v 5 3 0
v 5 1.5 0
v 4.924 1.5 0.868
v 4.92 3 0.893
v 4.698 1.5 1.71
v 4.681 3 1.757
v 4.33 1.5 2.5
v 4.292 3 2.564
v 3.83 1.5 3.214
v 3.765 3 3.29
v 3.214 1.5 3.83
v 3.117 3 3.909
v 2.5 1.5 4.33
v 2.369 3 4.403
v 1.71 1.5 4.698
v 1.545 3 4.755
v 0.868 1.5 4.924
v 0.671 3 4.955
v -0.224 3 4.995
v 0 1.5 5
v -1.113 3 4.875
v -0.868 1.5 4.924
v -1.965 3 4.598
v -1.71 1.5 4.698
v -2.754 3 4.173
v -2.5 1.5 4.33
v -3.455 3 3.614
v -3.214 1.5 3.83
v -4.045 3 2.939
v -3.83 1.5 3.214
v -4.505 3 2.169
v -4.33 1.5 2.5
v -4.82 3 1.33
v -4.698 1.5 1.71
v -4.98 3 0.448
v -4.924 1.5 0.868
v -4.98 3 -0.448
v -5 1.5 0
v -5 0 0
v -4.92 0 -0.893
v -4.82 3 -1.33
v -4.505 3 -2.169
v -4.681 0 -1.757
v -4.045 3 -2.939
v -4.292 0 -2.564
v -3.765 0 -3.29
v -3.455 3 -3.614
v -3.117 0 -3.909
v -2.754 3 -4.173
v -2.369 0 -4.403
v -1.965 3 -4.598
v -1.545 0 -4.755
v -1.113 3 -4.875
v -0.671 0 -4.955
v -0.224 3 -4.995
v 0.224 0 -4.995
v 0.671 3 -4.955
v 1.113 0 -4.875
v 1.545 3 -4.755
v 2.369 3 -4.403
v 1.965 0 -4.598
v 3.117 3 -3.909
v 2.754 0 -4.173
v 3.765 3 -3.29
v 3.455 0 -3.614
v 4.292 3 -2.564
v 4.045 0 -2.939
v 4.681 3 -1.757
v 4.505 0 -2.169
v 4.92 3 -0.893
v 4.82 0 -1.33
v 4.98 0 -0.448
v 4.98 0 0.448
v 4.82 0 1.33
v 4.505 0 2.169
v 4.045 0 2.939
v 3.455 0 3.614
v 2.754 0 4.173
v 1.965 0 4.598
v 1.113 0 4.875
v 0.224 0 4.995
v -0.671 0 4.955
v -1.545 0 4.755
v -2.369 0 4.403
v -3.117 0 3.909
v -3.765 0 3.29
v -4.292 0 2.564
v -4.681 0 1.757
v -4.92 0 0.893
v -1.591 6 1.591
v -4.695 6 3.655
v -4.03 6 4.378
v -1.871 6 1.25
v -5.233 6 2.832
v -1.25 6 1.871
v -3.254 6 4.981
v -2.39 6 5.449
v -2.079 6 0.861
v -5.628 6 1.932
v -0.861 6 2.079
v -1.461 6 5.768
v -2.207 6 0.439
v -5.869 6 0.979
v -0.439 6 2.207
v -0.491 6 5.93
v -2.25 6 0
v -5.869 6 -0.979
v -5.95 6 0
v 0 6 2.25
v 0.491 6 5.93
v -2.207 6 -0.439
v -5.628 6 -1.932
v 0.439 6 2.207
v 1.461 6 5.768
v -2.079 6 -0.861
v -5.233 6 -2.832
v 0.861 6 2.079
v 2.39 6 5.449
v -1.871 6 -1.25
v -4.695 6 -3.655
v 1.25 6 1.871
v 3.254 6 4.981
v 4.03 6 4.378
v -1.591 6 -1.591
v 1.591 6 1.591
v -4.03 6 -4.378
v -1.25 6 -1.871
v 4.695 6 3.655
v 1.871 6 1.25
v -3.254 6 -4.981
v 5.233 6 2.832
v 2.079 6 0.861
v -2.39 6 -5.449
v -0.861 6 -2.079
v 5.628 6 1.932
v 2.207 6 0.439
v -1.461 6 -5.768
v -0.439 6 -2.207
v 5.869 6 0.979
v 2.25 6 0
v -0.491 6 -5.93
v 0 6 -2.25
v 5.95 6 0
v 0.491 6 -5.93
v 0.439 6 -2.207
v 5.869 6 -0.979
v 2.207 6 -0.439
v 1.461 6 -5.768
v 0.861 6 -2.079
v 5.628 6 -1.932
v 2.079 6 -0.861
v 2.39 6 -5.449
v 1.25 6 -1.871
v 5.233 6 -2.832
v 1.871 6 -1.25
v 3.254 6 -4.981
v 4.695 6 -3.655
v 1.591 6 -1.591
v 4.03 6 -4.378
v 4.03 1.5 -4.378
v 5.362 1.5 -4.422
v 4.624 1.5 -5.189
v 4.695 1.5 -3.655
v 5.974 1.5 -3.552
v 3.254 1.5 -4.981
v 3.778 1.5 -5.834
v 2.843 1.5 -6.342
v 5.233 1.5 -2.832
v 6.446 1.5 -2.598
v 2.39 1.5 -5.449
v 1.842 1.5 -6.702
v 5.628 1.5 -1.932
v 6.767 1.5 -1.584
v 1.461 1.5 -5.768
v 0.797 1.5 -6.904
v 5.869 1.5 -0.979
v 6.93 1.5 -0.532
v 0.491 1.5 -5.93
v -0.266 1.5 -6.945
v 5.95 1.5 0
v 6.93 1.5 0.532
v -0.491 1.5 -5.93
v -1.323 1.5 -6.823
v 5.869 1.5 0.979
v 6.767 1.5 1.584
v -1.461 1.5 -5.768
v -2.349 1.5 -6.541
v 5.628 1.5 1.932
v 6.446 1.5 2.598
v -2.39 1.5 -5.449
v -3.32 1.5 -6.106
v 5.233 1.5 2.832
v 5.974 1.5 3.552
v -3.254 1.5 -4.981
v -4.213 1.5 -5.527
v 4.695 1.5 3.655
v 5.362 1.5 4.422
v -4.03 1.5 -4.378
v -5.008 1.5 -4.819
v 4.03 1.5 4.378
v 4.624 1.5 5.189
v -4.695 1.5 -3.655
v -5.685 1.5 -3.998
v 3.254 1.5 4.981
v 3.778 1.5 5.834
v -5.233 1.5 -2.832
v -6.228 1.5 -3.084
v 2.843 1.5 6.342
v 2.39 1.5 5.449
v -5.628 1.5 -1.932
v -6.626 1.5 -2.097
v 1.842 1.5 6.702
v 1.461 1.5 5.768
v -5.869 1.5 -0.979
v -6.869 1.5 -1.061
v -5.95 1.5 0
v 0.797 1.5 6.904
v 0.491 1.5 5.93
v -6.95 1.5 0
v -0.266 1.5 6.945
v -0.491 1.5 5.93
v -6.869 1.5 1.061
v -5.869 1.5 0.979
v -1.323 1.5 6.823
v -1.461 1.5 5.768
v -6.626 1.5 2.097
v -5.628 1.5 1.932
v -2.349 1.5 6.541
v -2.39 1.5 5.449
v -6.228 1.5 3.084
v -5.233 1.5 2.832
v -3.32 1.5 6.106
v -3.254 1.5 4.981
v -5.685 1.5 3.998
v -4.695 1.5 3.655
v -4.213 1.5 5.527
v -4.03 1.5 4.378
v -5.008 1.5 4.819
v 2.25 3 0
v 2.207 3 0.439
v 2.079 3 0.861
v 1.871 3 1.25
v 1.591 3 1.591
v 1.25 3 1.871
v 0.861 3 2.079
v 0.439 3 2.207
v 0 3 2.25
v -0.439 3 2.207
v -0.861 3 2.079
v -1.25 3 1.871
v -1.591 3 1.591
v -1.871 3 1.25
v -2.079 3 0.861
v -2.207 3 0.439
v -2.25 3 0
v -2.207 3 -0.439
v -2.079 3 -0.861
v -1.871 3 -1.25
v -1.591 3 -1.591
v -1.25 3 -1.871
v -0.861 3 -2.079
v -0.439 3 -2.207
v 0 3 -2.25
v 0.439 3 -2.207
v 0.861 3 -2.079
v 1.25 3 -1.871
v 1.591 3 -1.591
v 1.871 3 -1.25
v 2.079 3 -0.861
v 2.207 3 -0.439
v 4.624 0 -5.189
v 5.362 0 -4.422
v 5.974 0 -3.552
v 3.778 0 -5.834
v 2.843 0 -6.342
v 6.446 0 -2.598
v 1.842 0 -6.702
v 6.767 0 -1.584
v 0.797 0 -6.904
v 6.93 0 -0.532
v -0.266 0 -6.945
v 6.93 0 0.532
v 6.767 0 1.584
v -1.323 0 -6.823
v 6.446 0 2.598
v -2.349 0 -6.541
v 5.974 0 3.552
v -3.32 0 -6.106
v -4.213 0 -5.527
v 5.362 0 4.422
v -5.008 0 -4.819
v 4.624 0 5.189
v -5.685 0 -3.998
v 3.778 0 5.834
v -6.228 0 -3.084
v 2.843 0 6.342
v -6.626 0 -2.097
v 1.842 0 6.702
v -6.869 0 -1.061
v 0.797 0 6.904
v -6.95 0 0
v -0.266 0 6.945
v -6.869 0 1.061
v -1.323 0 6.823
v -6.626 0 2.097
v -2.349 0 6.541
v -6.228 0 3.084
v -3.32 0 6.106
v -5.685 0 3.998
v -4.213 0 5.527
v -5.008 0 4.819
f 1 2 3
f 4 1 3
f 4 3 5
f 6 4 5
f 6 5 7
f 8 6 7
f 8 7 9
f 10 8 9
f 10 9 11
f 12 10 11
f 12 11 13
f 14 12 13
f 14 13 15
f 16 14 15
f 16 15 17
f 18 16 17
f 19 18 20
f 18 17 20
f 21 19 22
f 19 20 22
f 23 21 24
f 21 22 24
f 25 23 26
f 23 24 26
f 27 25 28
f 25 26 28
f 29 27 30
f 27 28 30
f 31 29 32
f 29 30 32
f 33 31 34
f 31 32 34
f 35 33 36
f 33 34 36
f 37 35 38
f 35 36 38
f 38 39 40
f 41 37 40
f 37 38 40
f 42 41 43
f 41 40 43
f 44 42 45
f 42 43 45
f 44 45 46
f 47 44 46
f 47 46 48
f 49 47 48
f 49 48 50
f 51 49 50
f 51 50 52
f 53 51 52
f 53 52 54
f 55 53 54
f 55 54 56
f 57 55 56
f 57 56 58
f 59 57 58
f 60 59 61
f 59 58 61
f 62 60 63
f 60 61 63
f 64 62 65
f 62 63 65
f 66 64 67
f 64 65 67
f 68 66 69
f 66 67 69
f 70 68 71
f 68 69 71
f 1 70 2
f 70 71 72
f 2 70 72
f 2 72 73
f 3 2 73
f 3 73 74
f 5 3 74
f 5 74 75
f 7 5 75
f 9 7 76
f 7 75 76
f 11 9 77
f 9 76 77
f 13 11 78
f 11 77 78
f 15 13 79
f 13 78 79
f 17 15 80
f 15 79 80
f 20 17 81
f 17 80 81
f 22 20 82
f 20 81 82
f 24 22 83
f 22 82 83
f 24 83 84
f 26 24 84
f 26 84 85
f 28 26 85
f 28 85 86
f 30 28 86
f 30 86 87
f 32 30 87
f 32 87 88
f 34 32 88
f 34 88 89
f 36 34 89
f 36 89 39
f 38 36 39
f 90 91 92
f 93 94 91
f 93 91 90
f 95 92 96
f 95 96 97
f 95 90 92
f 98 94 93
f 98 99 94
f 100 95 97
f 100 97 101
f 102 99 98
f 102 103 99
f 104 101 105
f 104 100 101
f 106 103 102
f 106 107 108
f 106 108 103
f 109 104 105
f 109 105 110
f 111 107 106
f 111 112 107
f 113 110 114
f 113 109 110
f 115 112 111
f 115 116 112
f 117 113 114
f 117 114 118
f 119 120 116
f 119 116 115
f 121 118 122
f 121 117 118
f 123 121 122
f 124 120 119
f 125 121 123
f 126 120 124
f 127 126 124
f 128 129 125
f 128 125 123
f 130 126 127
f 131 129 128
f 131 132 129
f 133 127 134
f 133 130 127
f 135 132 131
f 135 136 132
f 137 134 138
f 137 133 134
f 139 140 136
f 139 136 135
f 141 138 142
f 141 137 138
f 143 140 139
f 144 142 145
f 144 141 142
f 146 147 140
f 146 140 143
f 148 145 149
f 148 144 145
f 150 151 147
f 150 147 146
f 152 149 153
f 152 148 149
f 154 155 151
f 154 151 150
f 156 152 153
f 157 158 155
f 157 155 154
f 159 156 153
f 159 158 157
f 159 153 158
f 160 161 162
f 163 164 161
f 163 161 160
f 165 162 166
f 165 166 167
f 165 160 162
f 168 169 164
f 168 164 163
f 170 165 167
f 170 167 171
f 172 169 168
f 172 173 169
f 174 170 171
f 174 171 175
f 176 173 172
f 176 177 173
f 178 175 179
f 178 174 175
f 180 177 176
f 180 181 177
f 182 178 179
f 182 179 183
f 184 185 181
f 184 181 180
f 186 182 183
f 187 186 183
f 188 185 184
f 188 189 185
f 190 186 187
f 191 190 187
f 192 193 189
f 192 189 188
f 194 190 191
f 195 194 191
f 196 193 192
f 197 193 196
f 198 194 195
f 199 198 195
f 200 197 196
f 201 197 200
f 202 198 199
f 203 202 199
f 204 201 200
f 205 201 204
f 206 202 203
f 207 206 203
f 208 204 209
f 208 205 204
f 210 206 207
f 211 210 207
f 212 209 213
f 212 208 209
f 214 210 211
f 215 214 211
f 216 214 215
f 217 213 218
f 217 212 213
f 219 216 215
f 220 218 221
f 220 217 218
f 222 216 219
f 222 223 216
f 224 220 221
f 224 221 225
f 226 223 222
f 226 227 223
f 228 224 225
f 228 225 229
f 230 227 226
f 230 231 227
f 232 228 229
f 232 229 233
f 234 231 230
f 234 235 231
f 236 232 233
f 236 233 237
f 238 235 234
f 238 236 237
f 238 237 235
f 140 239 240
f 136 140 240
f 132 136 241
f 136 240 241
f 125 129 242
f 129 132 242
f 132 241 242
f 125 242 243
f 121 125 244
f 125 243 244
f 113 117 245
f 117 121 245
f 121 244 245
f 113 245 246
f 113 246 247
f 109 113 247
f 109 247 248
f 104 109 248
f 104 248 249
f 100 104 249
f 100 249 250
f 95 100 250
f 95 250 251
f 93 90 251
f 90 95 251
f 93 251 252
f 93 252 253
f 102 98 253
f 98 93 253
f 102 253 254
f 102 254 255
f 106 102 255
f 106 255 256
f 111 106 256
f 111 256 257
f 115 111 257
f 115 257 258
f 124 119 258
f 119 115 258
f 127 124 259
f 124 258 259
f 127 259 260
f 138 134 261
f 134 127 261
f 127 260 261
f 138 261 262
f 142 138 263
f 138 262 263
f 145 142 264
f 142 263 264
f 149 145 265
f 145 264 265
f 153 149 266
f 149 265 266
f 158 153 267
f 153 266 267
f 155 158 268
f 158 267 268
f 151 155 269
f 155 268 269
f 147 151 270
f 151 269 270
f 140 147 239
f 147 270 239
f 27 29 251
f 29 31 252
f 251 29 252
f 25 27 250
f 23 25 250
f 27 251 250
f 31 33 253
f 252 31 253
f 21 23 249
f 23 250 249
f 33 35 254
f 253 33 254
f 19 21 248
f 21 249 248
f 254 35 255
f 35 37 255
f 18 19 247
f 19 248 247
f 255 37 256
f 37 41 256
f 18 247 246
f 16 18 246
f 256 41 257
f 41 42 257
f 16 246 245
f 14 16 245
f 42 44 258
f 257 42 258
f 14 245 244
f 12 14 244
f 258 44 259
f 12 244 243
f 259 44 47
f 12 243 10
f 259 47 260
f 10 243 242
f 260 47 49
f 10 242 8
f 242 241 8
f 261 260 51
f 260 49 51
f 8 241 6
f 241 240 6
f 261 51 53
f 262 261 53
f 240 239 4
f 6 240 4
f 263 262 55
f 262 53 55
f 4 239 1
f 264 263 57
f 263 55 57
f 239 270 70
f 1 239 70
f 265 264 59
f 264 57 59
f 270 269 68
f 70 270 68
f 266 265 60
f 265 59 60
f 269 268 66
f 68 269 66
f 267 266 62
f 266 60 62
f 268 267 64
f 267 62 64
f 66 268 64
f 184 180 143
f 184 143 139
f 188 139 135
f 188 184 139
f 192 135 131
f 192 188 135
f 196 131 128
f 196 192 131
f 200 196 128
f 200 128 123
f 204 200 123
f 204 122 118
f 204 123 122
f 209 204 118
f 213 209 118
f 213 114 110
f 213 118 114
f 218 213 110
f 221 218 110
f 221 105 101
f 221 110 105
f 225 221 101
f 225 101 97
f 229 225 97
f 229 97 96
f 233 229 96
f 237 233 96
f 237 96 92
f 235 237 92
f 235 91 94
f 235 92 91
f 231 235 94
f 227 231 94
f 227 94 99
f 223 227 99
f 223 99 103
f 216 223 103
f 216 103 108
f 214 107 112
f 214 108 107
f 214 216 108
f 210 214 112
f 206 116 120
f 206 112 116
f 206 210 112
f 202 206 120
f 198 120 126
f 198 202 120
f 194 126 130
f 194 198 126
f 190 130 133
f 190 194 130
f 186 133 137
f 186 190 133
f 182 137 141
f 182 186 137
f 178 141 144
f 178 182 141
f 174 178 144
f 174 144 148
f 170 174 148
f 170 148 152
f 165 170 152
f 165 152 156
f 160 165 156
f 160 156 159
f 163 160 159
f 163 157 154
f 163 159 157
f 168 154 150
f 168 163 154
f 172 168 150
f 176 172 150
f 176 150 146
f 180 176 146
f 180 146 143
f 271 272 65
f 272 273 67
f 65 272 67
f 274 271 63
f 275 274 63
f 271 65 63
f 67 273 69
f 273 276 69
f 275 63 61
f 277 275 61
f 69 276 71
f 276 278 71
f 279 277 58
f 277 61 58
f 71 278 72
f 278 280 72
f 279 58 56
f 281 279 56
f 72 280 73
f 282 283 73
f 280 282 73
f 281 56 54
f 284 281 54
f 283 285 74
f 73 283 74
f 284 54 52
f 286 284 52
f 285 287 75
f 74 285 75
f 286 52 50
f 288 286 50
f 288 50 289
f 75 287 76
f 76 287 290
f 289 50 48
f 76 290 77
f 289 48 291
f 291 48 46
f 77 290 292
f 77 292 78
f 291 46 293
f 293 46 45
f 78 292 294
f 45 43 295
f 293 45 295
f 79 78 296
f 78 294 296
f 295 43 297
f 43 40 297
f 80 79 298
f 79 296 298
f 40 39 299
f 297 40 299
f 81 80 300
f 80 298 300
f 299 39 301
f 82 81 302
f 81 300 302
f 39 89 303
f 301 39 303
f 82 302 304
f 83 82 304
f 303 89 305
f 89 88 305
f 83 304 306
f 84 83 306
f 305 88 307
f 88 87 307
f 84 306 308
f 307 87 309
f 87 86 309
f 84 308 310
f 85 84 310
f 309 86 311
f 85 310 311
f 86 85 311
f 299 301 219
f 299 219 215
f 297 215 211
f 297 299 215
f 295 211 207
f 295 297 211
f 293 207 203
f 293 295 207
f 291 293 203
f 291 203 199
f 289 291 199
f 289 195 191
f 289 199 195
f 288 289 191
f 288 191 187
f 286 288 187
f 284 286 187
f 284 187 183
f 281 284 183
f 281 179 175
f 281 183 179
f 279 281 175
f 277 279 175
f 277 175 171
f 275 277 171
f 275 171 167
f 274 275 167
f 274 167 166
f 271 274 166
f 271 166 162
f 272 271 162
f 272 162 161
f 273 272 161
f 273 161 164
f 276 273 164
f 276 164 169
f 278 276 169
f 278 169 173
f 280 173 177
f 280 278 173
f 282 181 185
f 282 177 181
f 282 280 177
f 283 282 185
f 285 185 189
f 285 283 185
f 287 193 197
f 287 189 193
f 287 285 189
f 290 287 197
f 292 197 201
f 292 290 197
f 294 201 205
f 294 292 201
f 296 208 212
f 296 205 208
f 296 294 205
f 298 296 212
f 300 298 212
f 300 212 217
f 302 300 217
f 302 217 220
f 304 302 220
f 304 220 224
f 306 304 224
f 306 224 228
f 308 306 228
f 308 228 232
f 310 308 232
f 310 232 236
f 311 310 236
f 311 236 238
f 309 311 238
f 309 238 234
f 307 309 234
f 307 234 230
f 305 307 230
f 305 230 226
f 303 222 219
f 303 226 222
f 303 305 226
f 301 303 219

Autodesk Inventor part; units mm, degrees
ref_plane "YZ Plane" through (0, 0, 0) normal (1, 0, 0) x (0, 1, 0)
ref_plane "XZ Plane" through (0, 0, 0) normal (0, 1, 0) x (-1, 0, 0)
ref_plane "XY Plane" through (0, 0, 0) normal (0, 0, 1) x (1, 0, 0)
sketch "Esquisse1" plane through (0, 0, 0) normal (0, 1, 0) x (-1, 0, 0)
  circle A0 centre (0, 0) radius 6.95
  circle A1 centre (0, 0) radius 5
  dimension "d0" = 13.9
  dimension "d1" = 10
extrude "Extrusion1" add sketch "Esquisse1" along normal blind 1.5
sketch "Esquisse2" plane through (0, 1.5, 0) normal (0, 1, 0) x (1, 0, 0)
  circle A0 centre (0, 0) radius 5 projected
  circle A1 centre (0, 0) radius 5.95
  dimension "d4" = 11.9
extrude "Extrusion2" add sketch "Esquisse2" along normal blind 1.5
sketch "Esquisse3" plane through (0, 3, 0) normal (0, 1, 0) x (1, 0, 0)
  circle A0 centre (0, 0) radius 2.25
  circle A1 centre (0, 0) radius 5.95 projected
  dimension "d7" = 4.5
extrude "Extrusion3" add sketch "Esquisse3" along normal blind 3
properties part number "moyeu_end"
